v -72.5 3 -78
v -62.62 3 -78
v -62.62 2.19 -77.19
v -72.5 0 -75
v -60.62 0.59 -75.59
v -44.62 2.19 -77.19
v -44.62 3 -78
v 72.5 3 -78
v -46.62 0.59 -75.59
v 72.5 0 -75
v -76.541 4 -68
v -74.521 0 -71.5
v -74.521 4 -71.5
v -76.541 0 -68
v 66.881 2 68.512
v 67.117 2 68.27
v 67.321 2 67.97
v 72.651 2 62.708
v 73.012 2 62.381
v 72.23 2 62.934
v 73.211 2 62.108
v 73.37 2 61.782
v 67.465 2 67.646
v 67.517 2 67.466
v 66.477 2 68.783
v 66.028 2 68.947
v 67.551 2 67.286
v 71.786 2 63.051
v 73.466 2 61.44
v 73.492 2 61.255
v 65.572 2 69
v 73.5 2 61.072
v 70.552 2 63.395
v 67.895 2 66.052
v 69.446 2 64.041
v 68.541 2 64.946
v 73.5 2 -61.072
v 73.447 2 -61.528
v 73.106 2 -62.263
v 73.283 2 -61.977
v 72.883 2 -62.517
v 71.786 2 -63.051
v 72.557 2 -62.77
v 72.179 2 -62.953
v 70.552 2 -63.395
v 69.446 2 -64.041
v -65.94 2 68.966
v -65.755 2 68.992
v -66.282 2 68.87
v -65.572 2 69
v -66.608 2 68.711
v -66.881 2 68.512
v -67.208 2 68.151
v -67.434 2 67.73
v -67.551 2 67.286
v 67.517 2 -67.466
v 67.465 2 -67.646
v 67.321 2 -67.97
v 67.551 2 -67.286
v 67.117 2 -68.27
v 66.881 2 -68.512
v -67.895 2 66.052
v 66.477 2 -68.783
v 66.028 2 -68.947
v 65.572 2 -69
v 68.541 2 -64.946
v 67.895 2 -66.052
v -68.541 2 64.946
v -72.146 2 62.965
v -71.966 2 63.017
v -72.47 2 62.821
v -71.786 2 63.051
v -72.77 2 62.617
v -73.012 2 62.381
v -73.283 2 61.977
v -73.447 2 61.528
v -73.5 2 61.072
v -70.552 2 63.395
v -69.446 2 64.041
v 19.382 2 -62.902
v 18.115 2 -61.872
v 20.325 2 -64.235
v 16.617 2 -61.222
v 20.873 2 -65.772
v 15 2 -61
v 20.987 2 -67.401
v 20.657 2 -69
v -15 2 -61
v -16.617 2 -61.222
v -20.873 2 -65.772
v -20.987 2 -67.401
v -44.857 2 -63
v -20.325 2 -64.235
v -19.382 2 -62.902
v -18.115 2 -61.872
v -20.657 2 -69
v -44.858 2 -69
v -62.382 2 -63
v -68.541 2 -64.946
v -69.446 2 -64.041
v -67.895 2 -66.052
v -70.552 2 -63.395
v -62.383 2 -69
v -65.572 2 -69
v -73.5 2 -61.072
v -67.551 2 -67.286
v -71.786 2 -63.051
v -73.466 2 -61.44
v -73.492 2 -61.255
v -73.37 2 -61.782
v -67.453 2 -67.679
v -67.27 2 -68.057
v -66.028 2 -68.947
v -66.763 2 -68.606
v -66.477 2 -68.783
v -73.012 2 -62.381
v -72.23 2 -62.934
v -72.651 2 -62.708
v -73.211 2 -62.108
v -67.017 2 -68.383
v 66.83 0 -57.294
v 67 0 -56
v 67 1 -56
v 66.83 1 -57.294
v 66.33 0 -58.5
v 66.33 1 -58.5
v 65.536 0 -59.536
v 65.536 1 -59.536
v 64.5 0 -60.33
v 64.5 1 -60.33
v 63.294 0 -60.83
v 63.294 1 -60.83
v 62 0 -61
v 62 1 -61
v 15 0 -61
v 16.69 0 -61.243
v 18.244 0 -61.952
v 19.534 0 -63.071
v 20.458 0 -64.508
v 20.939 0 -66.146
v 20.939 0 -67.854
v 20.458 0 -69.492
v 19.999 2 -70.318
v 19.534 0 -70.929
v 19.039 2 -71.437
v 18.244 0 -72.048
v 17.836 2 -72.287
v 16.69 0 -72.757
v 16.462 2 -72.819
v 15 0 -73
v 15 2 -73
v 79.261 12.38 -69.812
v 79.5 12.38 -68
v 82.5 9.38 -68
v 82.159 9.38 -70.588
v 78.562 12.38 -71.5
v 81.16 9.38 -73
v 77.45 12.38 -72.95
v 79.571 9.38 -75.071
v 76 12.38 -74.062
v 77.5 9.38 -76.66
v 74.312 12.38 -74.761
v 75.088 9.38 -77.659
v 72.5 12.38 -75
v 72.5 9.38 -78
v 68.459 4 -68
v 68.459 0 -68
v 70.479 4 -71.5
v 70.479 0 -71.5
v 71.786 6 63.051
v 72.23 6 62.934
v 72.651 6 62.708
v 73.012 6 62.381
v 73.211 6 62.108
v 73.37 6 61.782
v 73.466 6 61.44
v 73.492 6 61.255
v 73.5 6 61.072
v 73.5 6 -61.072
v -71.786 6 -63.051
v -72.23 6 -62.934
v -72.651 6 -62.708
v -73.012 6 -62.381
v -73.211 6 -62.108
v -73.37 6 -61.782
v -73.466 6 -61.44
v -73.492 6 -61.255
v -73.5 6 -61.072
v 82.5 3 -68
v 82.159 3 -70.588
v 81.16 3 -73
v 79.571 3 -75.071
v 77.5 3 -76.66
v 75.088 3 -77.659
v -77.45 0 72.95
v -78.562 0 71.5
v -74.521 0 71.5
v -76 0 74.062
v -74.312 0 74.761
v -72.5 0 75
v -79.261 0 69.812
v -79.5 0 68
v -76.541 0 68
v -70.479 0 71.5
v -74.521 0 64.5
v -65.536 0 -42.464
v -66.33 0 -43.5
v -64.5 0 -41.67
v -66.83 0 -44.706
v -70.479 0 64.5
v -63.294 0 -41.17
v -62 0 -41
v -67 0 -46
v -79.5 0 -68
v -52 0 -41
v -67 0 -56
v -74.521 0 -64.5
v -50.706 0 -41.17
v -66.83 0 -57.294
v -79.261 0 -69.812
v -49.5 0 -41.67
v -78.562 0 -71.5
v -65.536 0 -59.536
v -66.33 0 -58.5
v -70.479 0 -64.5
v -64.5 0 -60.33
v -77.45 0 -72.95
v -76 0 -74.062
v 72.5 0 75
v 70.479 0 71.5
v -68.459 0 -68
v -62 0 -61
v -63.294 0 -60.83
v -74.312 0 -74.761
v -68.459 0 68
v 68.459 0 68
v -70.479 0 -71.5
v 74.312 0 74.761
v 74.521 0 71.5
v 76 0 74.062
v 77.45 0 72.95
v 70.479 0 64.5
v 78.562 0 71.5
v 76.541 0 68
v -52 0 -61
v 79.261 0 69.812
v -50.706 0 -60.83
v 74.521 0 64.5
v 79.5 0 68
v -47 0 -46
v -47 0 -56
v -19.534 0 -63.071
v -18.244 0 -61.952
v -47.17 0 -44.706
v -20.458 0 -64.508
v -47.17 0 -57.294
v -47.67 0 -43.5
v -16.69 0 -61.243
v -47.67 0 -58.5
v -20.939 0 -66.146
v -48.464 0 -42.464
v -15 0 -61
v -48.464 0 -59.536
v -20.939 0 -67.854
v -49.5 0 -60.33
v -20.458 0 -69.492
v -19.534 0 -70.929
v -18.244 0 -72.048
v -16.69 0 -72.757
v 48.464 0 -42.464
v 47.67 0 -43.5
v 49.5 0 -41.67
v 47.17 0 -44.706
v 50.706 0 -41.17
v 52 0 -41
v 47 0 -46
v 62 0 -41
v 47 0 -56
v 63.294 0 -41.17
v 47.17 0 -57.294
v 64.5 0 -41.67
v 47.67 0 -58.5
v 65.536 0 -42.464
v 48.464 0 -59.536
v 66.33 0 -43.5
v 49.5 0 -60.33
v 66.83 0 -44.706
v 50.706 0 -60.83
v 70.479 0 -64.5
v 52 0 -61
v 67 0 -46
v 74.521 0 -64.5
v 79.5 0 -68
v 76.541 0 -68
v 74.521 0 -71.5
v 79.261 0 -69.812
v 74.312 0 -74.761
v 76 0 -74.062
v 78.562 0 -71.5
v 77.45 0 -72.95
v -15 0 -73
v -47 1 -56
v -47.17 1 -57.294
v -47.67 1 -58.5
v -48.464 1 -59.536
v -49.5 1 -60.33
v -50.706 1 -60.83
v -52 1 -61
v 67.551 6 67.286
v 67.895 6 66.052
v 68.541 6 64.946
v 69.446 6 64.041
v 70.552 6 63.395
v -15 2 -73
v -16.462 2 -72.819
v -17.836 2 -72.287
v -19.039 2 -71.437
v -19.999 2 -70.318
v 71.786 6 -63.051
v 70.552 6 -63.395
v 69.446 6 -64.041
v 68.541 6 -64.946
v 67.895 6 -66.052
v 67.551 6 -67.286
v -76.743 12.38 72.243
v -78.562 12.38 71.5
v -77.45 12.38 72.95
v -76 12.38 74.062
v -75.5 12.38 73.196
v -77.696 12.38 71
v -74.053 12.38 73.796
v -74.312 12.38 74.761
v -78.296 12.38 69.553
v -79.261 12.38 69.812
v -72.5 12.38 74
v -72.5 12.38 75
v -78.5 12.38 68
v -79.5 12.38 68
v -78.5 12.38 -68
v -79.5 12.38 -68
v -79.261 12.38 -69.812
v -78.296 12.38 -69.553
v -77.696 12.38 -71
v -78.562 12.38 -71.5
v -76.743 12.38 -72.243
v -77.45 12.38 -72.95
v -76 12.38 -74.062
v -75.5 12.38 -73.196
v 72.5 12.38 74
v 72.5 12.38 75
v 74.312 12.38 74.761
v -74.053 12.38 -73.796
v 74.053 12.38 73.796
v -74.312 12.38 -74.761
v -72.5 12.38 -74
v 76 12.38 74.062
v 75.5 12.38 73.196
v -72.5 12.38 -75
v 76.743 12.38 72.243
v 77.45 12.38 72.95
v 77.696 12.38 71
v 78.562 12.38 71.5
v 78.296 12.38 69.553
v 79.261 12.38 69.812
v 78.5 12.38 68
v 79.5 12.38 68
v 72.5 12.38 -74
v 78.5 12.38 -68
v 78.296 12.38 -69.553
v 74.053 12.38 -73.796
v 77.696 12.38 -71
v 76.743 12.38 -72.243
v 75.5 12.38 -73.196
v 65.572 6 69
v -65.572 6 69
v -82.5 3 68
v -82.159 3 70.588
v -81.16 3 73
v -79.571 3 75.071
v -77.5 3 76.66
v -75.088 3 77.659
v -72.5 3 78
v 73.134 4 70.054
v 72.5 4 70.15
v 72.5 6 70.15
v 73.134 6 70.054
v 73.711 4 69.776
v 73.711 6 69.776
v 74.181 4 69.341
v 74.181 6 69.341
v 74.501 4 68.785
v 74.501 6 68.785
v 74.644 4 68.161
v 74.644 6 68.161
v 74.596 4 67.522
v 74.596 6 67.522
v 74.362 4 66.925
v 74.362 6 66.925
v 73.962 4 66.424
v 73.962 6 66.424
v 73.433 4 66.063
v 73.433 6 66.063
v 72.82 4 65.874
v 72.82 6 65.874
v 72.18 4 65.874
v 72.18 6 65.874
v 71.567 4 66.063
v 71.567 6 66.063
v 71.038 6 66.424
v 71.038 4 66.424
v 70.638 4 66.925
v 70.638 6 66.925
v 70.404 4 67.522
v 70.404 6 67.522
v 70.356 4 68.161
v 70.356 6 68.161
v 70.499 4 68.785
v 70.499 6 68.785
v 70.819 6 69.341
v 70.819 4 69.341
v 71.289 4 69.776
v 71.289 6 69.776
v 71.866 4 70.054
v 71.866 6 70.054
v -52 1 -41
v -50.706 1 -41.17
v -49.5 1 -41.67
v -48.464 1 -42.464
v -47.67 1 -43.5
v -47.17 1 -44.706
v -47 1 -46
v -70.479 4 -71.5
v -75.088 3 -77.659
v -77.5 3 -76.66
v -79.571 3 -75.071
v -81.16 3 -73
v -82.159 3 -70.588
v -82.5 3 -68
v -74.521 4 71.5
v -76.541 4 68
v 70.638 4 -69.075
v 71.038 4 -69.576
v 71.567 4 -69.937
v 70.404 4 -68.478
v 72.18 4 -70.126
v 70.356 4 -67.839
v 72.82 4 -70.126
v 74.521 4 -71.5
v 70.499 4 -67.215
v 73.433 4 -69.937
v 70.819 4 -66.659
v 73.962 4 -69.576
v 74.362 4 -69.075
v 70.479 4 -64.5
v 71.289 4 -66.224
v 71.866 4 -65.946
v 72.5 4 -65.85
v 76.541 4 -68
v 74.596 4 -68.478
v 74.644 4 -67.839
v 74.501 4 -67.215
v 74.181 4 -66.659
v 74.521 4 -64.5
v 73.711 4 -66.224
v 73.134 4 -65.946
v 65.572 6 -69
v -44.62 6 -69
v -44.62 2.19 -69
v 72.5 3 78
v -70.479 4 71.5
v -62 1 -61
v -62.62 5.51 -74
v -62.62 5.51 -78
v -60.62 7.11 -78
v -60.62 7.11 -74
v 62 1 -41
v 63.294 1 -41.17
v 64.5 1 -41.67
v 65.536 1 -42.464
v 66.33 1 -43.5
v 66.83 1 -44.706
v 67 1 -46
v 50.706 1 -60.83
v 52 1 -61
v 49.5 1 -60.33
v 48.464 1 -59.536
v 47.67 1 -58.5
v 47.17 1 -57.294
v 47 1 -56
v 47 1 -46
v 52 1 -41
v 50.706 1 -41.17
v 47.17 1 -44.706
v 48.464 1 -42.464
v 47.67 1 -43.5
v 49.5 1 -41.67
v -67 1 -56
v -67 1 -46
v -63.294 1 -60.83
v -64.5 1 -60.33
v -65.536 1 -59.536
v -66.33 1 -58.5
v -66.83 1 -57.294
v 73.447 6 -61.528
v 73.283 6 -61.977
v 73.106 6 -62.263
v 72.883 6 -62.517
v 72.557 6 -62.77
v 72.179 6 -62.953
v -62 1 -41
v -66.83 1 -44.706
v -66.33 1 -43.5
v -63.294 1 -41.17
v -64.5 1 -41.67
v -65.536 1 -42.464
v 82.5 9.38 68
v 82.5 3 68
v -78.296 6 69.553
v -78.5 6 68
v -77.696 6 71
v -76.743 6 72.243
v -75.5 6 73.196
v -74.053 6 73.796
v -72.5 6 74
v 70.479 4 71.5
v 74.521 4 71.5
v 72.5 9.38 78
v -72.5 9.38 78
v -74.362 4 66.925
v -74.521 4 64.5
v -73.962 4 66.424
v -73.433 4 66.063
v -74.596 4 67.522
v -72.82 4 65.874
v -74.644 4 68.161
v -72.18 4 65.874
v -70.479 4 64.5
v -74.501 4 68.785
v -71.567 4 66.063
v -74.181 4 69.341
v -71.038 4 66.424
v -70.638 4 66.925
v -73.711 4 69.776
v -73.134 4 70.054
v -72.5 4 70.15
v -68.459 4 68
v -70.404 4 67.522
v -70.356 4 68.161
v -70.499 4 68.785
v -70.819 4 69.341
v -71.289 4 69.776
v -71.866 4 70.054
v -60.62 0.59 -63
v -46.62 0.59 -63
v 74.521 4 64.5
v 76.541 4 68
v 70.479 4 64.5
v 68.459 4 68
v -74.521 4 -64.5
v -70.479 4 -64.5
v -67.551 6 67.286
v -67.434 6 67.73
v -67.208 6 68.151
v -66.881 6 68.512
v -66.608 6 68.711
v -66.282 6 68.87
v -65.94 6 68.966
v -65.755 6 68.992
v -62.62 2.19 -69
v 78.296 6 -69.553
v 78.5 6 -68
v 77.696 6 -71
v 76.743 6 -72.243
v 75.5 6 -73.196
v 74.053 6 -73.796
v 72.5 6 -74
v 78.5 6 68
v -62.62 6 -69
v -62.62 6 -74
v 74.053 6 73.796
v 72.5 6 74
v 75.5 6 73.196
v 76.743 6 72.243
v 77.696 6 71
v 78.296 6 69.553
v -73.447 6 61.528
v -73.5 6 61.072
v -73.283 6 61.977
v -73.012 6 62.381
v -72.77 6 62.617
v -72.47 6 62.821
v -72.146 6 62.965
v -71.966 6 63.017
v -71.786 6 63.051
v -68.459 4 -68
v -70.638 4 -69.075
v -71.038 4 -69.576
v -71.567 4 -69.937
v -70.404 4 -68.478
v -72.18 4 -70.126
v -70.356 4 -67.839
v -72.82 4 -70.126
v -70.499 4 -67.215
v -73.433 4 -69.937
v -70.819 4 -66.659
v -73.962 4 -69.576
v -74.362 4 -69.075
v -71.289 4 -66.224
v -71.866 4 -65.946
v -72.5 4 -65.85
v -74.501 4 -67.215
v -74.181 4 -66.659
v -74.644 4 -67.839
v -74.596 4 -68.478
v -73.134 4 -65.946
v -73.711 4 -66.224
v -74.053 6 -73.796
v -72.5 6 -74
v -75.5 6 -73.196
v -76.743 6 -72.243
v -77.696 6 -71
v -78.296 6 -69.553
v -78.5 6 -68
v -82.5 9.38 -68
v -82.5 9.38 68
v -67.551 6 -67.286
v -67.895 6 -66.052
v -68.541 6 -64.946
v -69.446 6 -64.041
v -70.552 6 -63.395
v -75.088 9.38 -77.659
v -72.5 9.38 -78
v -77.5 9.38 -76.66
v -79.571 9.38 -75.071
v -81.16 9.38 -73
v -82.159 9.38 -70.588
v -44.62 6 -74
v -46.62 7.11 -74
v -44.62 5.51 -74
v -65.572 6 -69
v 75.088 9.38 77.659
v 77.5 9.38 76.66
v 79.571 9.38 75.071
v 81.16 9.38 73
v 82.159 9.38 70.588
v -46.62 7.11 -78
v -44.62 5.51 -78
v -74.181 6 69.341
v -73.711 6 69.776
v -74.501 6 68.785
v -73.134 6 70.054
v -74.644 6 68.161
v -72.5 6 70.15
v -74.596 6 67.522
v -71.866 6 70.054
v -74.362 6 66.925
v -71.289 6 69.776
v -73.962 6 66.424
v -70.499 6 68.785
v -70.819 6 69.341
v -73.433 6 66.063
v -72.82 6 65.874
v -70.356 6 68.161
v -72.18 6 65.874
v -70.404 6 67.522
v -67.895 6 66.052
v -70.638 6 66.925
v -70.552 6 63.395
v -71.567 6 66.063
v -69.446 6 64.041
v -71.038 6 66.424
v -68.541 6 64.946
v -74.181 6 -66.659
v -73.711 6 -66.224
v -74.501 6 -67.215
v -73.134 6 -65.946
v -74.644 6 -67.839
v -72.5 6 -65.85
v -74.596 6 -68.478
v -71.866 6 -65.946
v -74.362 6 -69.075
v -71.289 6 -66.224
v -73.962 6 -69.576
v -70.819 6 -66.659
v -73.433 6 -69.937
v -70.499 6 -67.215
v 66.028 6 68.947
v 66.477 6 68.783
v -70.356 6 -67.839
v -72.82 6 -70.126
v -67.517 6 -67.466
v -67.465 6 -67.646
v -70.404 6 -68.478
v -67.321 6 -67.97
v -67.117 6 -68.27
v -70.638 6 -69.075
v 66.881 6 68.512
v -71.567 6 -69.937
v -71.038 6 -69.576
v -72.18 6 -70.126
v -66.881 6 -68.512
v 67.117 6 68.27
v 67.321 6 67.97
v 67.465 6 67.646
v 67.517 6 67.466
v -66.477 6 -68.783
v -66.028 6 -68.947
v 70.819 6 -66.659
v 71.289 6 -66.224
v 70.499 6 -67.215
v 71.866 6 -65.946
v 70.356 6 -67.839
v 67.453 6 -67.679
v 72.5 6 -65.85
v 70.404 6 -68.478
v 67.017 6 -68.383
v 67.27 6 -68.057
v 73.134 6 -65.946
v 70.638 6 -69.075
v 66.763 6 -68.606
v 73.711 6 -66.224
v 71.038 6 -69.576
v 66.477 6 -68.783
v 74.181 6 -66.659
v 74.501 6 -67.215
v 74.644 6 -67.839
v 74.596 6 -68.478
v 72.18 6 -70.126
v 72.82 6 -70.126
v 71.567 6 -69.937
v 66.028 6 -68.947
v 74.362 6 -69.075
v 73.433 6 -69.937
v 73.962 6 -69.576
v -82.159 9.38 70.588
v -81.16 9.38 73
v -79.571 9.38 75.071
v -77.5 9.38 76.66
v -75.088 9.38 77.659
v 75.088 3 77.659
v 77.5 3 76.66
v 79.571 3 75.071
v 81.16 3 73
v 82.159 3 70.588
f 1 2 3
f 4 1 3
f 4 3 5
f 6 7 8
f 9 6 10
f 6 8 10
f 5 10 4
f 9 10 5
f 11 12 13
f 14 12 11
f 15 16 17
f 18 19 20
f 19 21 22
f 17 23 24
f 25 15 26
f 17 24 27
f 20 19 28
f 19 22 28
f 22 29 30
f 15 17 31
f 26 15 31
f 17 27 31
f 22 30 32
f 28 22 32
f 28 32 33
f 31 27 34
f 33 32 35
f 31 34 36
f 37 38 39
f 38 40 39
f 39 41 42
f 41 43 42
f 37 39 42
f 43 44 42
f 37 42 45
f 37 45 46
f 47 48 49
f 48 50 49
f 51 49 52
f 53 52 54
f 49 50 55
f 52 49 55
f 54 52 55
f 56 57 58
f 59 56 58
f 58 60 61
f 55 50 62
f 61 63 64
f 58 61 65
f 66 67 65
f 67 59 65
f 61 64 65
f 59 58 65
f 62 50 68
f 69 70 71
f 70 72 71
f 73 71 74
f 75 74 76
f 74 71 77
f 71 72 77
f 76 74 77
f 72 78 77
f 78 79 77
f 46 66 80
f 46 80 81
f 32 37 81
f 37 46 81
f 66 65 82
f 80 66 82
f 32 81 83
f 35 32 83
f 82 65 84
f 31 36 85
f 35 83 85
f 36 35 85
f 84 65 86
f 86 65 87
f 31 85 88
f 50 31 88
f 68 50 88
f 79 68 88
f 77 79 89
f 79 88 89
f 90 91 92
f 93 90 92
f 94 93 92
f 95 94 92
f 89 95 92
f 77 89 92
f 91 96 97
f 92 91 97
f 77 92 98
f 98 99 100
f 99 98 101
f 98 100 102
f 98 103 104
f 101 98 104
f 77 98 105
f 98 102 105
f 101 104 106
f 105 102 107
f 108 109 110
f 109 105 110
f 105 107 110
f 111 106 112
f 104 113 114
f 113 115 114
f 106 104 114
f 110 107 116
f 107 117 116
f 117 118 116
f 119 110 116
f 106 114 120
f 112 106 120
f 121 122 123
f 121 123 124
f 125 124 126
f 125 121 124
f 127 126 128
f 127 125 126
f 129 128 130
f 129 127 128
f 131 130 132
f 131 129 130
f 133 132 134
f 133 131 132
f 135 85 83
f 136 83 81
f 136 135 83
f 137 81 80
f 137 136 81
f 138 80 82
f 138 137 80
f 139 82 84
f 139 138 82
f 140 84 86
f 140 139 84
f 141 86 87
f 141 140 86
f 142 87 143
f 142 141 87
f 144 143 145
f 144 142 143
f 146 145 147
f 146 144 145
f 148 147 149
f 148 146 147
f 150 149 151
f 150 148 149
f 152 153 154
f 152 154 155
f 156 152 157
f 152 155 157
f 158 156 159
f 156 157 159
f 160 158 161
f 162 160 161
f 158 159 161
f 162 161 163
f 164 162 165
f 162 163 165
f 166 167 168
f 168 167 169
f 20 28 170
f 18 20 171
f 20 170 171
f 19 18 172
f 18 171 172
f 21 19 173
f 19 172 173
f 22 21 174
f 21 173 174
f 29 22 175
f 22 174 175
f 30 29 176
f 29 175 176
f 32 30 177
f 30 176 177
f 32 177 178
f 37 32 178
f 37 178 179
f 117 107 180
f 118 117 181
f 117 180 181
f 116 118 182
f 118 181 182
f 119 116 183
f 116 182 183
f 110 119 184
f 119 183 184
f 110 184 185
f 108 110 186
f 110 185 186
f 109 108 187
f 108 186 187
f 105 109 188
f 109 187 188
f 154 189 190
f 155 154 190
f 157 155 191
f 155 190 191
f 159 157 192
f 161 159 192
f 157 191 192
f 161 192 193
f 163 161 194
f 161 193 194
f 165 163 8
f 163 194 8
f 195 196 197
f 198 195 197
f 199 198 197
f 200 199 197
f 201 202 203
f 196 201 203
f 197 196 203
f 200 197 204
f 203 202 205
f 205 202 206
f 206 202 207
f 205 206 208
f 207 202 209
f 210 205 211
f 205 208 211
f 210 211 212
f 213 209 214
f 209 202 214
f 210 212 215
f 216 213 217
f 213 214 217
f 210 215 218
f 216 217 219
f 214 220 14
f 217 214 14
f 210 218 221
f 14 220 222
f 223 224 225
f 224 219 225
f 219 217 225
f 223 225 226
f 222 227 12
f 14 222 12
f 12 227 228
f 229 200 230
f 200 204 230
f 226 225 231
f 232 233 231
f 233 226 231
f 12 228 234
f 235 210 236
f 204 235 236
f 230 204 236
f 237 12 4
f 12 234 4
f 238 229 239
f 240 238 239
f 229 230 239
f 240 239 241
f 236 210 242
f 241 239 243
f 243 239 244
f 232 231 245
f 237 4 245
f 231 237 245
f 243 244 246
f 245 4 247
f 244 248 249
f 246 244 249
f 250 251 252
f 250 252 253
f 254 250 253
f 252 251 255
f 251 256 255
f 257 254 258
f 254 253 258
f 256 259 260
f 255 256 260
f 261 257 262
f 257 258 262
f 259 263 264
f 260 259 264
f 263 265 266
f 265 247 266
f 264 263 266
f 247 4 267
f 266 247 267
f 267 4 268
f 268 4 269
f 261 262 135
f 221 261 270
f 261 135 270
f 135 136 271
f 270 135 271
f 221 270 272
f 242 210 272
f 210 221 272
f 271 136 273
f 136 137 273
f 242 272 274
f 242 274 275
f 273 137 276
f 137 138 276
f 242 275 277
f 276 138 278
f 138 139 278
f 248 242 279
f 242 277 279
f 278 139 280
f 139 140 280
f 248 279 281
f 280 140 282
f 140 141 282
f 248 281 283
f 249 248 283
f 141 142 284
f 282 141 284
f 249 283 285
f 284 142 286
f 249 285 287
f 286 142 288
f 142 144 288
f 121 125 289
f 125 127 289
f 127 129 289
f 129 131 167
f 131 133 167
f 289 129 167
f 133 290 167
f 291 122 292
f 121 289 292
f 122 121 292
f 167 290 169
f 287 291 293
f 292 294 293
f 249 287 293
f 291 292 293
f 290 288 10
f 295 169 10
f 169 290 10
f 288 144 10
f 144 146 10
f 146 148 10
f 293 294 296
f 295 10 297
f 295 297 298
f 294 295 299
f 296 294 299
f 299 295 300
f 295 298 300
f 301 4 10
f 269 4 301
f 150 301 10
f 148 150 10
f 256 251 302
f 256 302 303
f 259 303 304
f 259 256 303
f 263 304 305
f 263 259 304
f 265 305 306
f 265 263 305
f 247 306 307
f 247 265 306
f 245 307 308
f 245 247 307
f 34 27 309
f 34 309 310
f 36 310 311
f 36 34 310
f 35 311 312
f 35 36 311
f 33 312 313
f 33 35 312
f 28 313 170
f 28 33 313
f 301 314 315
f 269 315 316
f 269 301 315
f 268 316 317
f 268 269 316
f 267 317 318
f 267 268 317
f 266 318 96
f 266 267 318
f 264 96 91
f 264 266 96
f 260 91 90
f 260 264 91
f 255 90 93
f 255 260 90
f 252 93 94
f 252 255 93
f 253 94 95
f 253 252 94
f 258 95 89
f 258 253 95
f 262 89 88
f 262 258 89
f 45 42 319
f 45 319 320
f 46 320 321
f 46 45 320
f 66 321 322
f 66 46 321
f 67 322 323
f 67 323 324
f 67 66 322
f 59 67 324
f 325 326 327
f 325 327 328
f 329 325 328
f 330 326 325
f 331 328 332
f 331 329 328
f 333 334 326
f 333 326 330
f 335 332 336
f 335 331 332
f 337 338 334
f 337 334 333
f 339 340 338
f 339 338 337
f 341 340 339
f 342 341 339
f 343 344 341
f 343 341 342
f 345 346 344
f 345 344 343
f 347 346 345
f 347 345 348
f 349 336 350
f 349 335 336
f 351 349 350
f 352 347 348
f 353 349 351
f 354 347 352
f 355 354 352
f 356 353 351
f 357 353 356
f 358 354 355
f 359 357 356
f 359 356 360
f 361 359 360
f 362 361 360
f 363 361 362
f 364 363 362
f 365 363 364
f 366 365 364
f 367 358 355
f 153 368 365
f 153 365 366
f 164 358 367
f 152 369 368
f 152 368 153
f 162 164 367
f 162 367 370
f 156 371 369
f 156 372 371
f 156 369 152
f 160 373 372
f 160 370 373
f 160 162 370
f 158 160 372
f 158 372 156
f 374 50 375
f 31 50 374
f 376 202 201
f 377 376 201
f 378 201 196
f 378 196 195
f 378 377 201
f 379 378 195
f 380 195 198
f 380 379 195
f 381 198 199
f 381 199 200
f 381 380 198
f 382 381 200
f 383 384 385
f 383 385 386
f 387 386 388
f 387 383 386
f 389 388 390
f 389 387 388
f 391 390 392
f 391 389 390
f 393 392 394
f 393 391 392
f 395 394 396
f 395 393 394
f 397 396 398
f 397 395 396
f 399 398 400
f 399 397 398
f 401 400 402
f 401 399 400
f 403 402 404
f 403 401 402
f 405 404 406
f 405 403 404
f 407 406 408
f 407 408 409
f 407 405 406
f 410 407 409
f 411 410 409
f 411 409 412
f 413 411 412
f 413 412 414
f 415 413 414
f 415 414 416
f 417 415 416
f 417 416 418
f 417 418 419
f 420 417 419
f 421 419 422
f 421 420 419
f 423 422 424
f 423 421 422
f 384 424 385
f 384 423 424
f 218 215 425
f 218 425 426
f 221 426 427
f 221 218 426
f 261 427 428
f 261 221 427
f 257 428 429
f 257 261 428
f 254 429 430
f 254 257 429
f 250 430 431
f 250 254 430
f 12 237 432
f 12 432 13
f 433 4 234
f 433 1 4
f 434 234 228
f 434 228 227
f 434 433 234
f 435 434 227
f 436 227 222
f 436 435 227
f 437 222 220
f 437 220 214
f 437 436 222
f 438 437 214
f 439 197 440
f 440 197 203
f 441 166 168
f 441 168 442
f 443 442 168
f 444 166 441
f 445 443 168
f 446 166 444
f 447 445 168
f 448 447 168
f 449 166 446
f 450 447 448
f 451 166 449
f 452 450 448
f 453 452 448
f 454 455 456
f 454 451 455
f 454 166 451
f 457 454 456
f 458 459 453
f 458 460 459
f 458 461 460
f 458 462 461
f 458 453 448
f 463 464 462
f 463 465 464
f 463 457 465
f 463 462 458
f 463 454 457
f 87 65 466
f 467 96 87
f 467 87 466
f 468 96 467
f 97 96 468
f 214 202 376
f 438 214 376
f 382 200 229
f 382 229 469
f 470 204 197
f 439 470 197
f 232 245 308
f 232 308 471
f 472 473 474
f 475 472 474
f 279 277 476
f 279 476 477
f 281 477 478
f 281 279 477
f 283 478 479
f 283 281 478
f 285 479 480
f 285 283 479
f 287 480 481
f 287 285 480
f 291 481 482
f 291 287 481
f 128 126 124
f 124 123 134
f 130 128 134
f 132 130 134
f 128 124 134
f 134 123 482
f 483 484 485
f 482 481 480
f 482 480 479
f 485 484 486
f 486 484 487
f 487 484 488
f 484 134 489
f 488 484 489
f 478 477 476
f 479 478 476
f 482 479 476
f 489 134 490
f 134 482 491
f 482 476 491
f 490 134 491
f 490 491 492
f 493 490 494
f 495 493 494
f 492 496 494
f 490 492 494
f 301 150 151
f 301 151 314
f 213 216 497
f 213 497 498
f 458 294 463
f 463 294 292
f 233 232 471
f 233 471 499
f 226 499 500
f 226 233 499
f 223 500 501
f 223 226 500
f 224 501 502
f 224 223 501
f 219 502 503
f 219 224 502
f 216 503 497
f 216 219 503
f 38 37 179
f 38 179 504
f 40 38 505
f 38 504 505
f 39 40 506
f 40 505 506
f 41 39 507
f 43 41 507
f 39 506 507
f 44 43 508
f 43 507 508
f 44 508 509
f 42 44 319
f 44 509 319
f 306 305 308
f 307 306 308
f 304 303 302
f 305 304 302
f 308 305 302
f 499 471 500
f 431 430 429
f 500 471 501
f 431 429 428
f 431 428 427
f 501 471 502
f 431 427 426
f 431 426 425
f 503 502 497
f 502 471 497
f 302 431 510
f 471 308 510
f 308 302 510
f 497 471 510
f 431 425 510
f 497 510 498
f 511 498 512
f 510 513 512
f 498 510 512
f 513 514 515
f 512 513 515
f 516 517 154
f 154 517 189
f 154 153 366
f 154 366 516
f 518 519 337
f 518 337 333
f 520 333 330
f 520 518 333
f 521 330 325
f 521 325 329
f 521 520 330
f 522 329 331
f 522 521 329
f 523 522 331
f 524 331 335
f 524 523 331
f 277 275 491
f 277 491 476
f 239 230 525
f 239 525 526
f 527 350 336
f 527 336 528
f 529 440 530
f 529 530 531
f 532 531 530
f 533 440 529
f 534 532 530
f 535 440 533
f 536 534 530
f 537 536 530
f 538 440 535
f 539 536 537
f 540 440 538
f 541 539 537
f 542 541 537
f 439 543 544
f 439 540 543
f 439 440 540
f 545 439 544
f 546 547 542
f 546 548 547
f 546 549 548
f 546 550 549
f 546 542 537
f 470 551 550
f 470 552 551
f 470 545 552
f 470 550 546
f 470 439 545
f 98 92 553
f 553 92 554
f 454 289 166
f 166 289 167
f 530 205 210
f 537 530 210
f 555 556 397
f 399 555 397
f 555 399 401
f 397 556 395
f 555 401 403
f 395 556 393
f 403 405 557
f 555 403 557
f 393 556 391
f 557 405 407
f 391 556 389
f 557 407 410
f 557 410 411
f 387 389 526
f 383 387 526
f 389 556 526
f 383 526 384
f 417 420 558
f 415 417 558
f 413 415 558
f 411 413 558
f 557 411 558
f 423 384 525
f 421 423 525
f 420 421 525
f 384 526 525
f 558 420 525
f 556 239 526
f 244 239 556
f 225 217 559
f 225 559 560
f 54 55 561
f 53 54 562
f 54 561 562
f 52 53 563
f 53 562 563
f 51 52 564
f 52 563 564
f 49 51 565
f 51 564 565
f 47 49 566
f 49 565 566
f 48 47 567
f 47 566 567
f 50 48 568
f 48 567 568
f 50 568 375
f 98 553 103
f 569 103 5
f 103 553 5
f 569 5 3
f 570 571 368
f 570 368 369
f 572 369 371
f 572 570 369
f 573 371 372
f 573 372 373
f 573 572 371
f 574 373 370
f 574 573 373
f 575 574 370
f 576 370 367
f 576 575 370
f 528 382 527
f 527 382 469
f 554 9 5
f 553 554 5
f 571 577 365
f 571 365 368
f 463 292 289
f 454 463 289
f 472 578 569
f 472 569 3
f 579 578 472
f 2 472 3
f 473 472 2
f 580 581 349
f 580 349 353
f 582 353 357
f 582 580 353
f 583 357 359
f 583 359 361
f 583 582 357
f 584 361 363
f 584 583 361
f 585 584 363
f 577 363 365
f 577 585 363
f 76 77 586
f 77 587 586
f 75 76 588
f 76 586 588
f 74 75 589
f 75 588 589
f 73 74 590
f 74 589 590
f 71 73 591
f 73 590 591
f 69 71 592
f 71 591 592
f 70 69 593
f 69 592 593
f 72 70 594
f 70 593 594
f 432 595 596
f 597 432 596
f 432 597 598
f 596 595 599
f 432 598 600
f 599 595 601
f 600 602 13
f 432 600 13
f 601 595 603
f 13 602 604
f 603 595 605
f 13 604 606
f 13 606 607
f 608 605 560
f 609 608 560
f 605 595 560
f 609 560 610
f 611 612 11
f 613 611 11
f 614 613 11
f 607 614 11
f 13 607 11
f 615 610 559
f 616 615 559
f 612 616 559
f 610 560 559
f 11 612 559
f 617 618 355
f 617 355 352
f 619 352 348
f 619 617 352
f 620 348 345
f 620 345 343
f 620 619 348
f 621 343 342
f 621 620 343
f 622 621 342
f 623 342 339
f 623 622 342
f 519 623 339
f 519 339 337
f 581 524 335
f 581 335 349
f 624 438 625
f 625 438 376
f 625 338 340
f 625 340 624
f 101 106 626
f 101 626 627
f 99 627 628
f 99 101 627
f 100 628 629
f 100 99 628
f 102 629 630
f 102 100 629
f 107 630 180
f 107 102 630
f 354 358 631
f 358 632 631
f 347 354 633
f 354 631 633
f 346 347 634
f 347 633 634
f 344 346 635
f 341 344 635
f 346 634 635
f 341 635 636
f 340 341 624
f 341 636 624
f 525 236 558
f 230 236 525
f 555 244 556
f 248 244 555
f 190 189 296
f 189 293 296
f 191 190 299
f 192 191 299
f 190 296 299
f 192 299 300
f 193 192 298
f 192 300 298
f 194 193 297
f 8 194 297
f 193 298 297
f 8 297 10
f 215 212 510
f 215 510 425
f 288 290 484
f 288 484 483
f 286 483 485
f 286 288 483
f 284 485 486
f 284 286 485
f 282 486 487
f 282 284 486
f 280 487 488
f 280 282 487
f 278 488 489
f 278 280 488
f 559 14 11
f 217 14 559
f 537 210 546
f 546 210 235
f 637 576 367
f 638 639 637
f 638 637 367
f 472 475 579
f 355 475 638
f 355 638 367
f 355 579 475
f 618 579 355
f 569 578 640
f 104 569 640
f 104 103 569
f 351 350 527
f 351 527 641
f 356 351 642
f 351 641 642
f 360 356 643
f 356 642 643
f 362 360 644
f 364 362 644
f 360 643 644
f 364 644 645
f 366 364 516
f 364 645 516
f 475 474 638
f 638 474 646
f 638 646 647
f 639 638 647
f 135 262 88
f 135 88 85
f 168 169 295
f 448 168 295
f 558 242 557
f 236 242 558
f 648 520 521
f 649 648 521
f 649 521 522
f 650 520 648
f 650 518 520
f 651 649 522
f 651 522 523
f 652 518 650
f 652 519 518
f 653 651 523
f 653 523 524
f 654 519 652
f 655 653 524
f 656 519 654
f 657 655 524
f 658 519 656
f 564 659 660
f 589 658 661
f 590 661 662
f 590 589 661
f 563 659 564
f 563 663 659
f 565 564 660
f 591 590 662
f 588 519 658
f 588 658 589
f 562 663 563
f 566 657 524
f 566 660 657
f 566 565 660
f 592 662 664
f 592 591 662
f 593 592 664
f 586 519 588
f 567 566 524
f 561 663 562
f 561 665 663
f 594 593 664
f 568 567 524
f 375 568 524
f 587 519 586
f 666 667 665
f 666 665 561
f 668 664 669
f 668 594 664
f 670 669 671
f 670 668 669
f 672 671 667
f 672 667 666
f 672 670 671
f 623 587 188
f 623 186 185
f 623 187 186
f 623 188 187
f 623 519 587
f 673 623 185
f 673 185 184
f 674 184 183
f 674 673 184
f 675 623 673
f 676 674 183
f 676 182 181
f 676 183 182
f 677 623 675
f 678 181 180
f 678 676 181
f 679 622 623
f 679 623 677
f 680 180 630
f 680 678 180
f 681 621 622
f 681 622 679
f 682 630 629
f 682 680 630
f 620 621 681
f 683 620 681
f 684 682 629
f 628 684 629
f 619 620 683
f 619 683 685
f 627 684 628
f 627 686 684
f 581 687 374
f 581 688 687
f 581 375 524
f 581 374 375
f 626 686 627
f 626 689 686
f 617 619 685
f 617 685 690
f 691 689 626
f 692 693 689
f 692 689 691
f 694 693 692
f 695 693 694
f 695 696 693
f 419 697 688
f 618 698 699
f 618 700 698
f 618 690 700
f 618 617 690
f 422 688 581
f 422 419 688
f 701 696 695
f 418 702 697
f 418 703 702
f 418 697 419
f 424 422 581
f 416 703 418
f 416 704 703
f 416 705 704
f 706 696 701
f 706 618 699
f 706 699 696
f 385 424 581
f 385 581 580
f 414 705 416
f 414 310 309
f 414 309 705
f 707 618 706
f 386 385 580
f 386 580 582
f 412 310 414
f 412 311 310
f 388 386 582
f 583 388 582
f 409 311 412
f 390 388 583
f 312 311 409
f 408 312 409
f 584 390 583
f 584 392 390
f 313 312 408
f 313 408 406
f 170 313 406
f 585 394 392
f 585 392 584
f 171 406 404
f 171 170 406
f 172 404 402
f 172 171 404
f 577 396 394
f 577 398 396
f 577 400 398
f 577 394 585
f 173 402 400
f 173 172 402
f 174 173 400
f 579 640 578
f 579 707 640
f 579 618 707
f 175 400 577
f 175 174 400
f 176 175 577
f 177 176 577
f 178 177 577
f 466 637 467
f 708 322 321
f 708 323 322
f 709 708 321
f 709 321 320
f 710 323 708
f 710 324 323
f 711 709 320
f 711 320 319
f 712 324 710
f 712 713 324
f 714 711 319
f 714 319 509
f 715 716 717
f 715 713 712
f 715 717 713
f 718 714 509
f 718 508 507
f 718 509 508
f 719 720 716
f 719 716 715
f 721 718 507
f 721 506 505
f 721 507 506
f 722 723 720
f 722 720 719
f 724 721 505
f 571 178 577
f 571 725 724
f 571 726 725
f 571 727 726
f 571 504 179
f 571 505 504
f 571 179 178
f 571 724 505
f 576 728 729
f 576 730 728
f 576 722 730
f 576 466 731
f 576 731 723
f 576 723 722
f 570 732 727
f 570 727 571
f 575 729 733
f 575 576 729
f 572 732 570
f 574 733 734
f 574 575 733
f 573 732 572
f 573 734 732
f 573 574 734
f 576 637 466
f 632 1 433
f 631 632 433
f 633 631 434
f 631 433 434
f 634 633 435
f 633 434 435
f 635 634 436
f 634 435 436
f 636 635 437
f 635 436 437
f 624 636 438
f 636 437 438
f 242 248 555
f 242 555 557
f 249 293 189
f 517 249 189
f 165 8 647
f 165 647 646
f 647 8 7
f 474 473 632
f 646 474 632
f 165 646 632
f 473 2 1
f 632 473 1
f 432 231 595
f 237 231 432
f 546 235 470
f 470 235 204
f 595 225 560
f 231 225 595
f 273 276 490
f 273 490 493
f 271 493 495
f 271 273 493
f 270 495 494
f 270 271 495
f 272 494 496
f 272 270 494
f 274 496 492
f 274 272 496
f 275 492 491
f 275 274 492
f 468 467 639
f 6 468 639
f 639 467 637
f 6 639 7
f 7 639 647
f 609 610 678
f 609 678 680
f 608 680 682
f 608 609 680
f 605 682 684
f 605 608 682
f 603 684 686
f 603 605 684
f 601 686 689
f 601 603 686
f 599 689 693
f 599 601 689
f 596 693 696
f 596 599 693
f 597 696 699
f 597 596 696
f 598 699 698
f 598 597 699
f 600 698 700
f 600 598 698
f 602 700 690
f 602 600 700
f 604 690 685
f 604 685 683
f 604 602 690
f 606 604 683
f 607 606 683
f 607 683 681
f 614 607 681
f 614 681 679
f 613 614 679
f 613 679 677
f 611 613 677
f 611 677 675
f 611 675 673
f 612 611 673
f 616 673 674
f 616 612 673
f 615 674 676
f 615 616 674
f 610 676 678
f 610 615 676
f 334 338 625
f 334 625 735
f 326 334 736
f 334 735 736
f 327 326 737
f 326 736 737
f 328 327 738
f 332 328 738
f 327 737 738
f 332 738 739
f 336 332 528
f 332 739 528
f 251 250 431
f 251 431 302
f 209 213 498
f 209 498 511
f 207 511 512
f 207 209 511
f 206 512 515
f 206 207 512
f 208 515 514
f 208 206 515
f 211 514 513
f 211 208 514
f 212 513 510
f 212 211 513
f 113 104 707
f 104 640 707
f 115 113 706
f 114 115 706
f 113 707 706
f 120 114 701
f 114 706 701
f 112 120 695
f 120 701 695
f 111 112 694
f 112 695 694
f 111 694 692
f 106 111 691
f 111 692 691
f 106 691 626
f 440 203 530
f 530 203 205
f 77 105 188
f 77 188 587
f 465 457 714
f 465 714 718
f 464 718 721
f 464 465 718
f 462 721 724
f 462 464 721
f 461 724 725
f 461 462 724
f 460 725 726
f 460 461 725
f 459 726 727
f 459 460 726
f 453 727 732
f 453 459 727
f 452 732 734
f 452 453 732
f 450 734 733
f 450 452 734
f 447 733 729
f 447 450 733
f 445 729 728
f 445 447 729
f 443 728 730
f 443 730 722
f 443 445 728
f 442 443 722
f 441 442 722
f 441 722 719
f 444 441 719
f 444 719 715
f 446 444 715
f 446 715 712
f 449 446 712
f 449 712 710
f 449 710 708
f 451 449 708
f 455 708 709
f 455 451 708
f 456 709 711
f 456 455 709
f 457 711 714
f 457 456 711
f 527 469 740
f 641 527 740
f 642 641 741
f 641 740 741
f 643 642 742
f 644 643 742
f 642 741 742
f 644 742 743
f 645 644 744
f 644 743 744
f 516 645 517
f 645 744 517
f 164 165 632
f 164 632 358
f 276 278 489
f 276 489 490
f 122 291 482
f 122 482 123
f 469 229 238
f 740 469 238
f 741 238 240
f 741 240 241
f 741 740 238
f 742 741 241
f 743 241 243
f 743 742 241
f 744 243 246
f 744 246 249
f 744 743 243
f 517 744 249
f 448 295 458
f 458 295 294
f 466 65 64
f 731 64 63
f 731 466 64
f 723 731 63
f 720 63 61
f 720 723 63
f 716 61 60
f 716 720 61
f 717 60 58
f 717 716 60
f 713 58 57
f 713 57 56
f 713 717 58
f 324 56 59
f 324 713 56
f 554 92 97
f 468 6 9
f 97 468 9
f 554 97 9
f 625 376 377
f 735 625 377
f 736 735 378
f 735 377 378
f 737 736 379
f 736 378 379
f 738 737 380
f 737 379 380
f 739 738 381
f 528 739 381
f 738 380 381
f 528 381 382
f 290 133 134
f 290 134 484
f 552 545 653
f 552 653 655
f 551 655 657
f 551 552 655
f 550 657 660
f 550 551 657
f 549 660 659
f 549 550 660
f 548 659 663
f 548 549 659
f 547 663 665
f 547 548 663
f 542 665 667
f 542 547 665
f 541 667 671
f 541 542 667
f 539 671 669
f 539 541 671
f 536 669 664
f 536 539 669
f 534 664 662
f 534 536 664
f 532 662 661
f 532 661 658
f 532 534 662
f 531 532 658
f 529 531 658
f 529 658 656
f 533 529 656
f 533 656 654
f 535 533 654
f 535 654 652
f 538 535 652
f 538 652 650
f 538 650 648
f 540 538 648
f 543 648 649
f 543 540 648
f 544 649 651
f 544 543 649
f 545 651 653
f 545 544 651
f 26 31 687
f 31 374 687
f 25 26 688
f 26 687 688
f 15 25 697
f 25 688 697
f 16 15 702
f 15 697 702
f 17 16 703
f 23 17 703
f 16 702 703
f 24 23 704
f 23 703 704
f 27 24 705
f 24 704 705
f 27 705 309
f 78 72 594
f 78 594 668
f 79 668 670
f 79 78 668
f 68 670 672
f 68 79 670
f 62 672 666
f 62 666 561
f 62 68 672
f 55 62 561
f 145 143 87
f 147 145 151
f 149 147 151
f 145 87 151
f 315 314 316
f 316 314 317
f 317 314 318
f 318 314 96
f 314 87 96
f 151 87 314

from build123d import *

# Parameters (mm, degrees)
BOSS_EXTRUDE2_DEPTH      = 2
BOSS_EXTRUDE3_DEPTH      = 4
BOSS_EXTRUDE3_DEPTH_BACK = 2
SKETCH3_R                = 2.15
BOSS_EXTRUDE4_DEPTH      = 6.38
CUT_EXTRUDE1_DEPTH       = 15
FILLET1_R                = 2
CUT_EXTRUDE3_DEPTH       = 115.008747033
CUT_EXTRUDE3_DEPTH_BACK  = 115.008747033
SKETCH11_R               = 2.15
CUT_EXTRUDE2_DEPTH       = 4
CHAMFER1_SIZE            = 3
SKETCH13_W               = 18
SKETCH13_H               = 5
CUT_EXTRUDE5_DEPTH       = 1
CUT_EXTRUDE6_DEPTH       = 1
CUT_EXTRUDE7_DEPTH       = 2


with BuildPart() as part:
    # Sketch2 → Boss-Extrude2 (new body)
    with BuildSketch(Plane(origin=(0, 0, 0), x_dir=(1, 0, 0), z_dir=(0, 1, 0))):
        with BuildLine():
            Line((-72.5, 74), (72.5, 74))
            ThreePointArc((72.5, 74), (76.742640687, 72.242640687), (78.5, 68))
            Line((78.5, 68), (78.5, -68))
            ThreePointArc((78.5, -68), (76.742640687, -72.242640687), (72.5, -74))
            Line((72.5, -74), (-72.5, -74))
            ThreePointArc((-72.5, -74), (-76.742640687, -72.242640687), (-78.5, -68))
            Line((-78.5, -68), (-78.5, 68))
            ThreePointArc((-78.5, 68), (-76.742640687, 72.242640687), (-72.5, 74))
        make_face()
    extrude(amount=BOSS_EXTRUDE2_DEPTH)

    # Sketch3 → Boss-Extrude3 (add, two sides: drawn at the far end of the back side and taken through both)
    with BuildSketch(Plane(origin=(0, 2, 0), x_dir=(1, 0, 0), z_dir=(0, 1, 0)).offset(-BOSS_EXTRUDE3_DEPTH_BACK)):
        with BuildLine():
            Line((-82.5, 68), (-82.5, -68))
            ThreePointArc((-82.5, -68), (-79.571067812, -75.071067812), (-72.5, -78))
            Line((-72.5, -78), (72.5, -78))
            ThreePointArc((72.5, -78), (79.571067812, -75.071067812), (82.5, -68))
            Line((82.5, -68), (82.5, 68))
            ThreePointArc((82.5, 68), (79.571067812, 75.071067812), (72.5, 78))
            Line((72.5, 78), (-72.5, 78))
            ThreePointArc((-72.5, 78), (-79.571067812, 75.071067812), (-82.5, 68))
        make_face()
        with Locations(Location((-72.5, -68, 0), (0, 0, 270))):
            Circle(SKETCH3_R, mode=Mode.SUBTRACT)
        with Locations(Location((72.5, -68, 0), (0, 0, 270))):
            Circle(SKETCH3_R, mode=Mode.SUBTRACT)
        with Locations(Location((72.5, 68, 0), (0, 0, 270))):
            Circle(SKETCH3_R, mode=Mode.SUBTRACT)
        with Locations(Location((-72.5, 68, 0), (0, 0, 270))):
            Circle(SKETCH3_R, mode=Mode.SUBTRACT)
        with BuildLine():
            Line((-73.5, 63), (-73.5, -63))
            Line((-73.5, -63), (-72.5, -63))
            ThreePointArc((-72.5, -63), (-68.964466094, -64.464466094), (-67.5, -68))
            Line((-67.5, -68), (-67.5, -69))
            Line((-67.5, -69), (67.5, -69))
            Line((67.5, -69), (67.5, -68))
            ThreePointArc((67.5, -68), (68.964466094, -64.464466094), (72.5, -63))
            Line((72.5, -63), (73.5, -63))
            Line((73.5, -63), (73.5, 63))
            Line((73.5, 63), (72.5, 63))
            ThreePointArc((72.5, 63), (68.964466094, 64.464466094), (67.5, 68))
            Line((67.5, 68), (67.5, 69))
            Line((67.5, 69), (-67.5, 69))
            Line((-67.5, 69), (-67.5, 68))
            ThreePointArc((-67.5, 68), (-68.964466094, 64.464466094), (-72.5, 63))
            Line((-72.5, 63), (-73.5, 63))
        make_face(mode=Mode.SUBTRACT)
    extrude(amount=BOSS_EXTRUDE3_DEPTH + BOSS_EXTRUDE3_DEPTH_BACK)

    # Sketch8 → Boss-Extrude4 (add)
    with BuildSketch(Plane(origin=(0, 6, 0), x_dir=(1, 0, 0), z_dir=(0, 1, 0))):
        with BuildLine():
            ThreePointArc((82.5, 68), (79.571067812, 75.071067812), (72.5, 78))
            Line((72.5, 78), (-72.5, 78))
            ThreePointArc((-72.5, 78), (-79.571067812, 75.071067812), (-82.5, 68))
            Line((-82.5, 68), (-82.5, -68))
            ThreePointArc((-82.5, -68), (-79.571067812, -75.071067812), (-72.5, -78))
            Line((-72.5, -78), (72.5, -78))
            ThreePointArc((72.5, -78), (79.571067812, -75.071067812), (82.5, -68))
            Line((82.5, -68), (82.5, 68))
        make_face()
        with BuildLine():
            ThreePointArc((72.5, -74), (76.742640687, -72.242640687), (78.5, -68))
            Line((78.5, -68), (78.5, 68))
            ThreePointArc((78.5, 68), (76.742640687, 72.242640687), (72.5, 74))
            Line((72.5, 74), (-72.5, 74))
            ThreePointArc((-72.5, 74), (-76.742640687, 72.242640687), (-78.5, 68))
            Line((-78.5, 68), (-78.5, -68))
            ThreePointArc((-78.5, -68), (-76.742640687, -72.242640687), (-72.5, -74))
            Line((-72.5, -74), (72.5, -74))
        make_face(mode=Mode.SUBTRACT)
    extrude(amount=BOSS_EXTRUDE4_DEPTH)

    # Sketch9 → Cut-Extrude1 (cut)
    with BuildSketch(Plane(origin=(0, 0, -78), x_dir=(-1, 0, 0), z_dir=(0, 0, -1))):
        Polygon((60.62, 7.11), (46.62, 7.11), (44.62, 5.51), (44.62, 2.19), (46.62, 0.59), (60.62, 0.59), (62.62, 2.19), (62.62, 5.51), align=None)
    extrude(amount=-CUT_EXTRUDE1_DEPTH, mode=Mode.SUBTRACT)

    # Fillet1
    fillet1_edges = [part.edges().sort_by_distance(p)[0] for p in [
        (-67.5, 4, -69),
        (-73.5, 4, -63),
        (-73.5, 4, 63),
        (-67.5, 4, 69),
        (73.5, 4, 63),
        (67.5, 4, 69),
        (67.5, 4, -69),
        (73.5, 4, -63),
    ]]
    fillet(fillet1_edges, radius=FILLET1_R)

    # Sketch11 → Cut-Extrude3 (cut, two sides: drawn at the far end of the back side and taken through both)
    with BuildSketch(Plane(origin=(0, 2, 0), x_dir=(1, 0, 0), z_dir=(0, 1, 0)).offset(-CUT_EXTRUDE3_DEPTH_BACK)):
        with Locations(Location((-72.5, -68, 0), (0, 0, 270))):
            Circle(SKETCH11_R)
        with Locations(Location((72.5, -68, 0), (0, 0, 270))):
            Circle(SKETCH11_R)
        with Locations(Location((72.5, 68, 0), (0, 0, 270))):
            Circle(SKETCH11_R)
        with Locations(Location((-72.5, 68, 0), (0, 0, 270))):
            Circle(SKETCH11_R)
    extrude(amount=CUT_EXTRUDE3_DEPTH + CUT_EXTRUDE3_DEPTH_BACK, mode=Mode.SUBTRACT)

    # Sketch10 → Cut-Extrude2 (cut)
    with BuildSketch(Plane.XZ):
        Polygon((-74.520725942, 64.5), (-70.479274058, 64.5), (-68.458548116, 68), (-70.479274058, 71.5), (-74.520725942, 71.5), (-76.541451884, 68), align=None)
        Polygon((76.541451884, 68), (74.520725942, 64.5), (70.479274058, 64.5), (68.458548116, 68), (70.479274058, 71.5), (74.520725942, 71.5), align=None)
        Polygon((-70.479274058, -64.5), (-68.458548116, -68), (-70.479274058, -71.5), (-74.520725942, -71.5), (-76.541451884, -68), (-74.520725942, -64.5), align=None)
        Polygon((76.541451884, -68), (74.520725942, -64.5), (70.479274058, -64.5), (68.458548116, -68), (70.479274058, -71.5), (74.520725942, -71.5), align=None)
    extrude(amount=-CUT_EXTRUDE2_DEPTH, mode=Mode.SUBTRACT)

    # Chamfer1
    # the kernel refuses this chamfer: 3 mm, written as the material it takes off along each edge
    with BuildSketch(Plane(origin=(-72.5, 12.38, 68), x_dir=(-1, 0, 0), z_dir=(0, 0, -1))) as chamfer1_piece_1:
        Polygon((10 - CHAMFER1_SIZE, 0), (10, -CHAMFER1_SIZE), (10, 0), align=None)
    revolve(axis=Axis((-72.5, 12.38, 68), (0, 1, 0)), revolution_arc=90, mode=Mode.SUBTRACT)
    with BuildSketch(Plane(origin=(-72.5, 12.38, 78), x_dir=(0, 0.02749587661058619, -0.9996219169112968), z_dir=(1, 0, 0)), Plane(origin=(72.5, 0, -78), x_dir=(0, 0.9996219169112968, -0.027495876610586778), z_dir=(-1, 0, 0))) as chamfer1_piece_2:
        Polygon((CHAMFER1_SIZE * 0.999621916911, -CHAMFER1_SIZE * 0.0274958766106), (-CHAMFER1_SIZE * 0.0274958766106, -CHAMFER1_SIZE * 0.999621916911), (0, 0), align=None)
    extrude(amount=145, mode=Mode.SUBTRACT)
    with BuildSketch(Plane(origin=(72.5, 12.38, 68), x_dir=(0, 0, 1), z_dir=(-1, 0, 0))) as chamfer1_piece_3:
        Polygon((10 - CHAMFER1_SIZE, 0), (10, -CHAMFER1_SIZE), (10, 0), align=None)
    revolve(axis=Axis((72.5, 12.38, 68), (0, 1, 0)), revolution_arc=90, mode=Mode.SUBTRACT)
    with BuildSketch(Plane(origin=(82.5, 12.38, 68), x_dir=(-0.9996219169112968, 0.02749587661058619, 0), z_dir=(0, 0, -1)), Plane(origin=(-82.5, 12.38, -68), x_dir=(0.9996219169112968, 0.02749587661058619, 0), z_dir=(0, 0, 1))) as chamfer1_piece_4:
        Polygon((CHAMFER1_SIZE * 0.999621916911, -CHAMFER1_SIZE * 0.0274958766106), (-CHAMFER1_SIZE * 0.0274958766106, -CHAMFER1_SIZE * 0.999621916911), (0, 0), align=None)
    extrude(amount=136, mode=Mode.SUBTRACT)
    with BuildSketch(Plane(origin=(72.5, 12.38, -68), x_dir=(1, 0, 0), z_dir=(0, 0, 1))) as chamfer1_piece_5:
        Polygon((10 - CHAMFER1_SIZE, 0), (10, -CHAMFER1_SIZE), (10, 0), align=None)
    revolve(axis=Axis((72.5, 12.38, -68), (0, 1, 0)), revolution_arc=90, mode=Mode.SUBTRACT)
    with BuildSketch(Plane(origin=(72.5, 12.38, -78), x_dir=(0, -0.9996219169112968, -0.02749587661058678), z_dir=(-1, 0, 0)), Plane(origin=(-72.5, 0, 78), x_dir=(0, -0.02749587661058636, -0.9996219169112968), z_dir=(1, 0, 0))) as chamfer1_piece_6:
        Polygon((CHAMFER1_SIZE * 0.999621916911, CHAMFER1_SIZE * 0.0274958766106), (-CHAMFER1_SIZE * 0.0274958766106, CHAMFER1_SIZE * 0.999621916911), (0, 0), align=None)
    extrude(amount=145, mode=Mode.SUBTRACT)
    with BuildSketch(Plane(origin=(-72.5, 12.38, -68), x_dir=(0, 0, -1), z_dir=(1, 0, 0))) as chamfer1_piece_7:
        Polygon((10 - CHAMFER1_SIZE, 0), (10, -CHAMFER1_SIZE), (10, 0), align=None)
    revolve(axis=Axis((-72.5, 12.38, -68), (0, 1, 0)), revolution_arc=90, mode=Mode.SUBTRACT)
    with BuildSketch(Plane(origin=(-72.5, 0, -68), x_dir=(0, 0, -1), z_dir=(1, 0, 0))) as chamfer1_piece_8:
        Polygon((10 - CHAMFER1_SIZE, 0), (10, CHAMFER1_SIZE), (10, 0), align=None)
    revolve(axis=Axis((-72.5, 0, -68), (0, 1, 0)), revolution_arc=90, mode=Mode.SUBTRACT)
    with BuildSketch(Plane(origin=(-82.5, 0, -68), x_dir=(0.9996219169112968, -0.02749587661058636, 0), z_dir=(0, 0, 1)), Plane(origin=(82.5, 0, 68), x_dir=(-0.9996219169112968, -0.02749587661058636, 0), z_dir=(0, 0, -1))) as chamfer1_piece_9:
        Polygon((CHAMFER1_SIZE * 0.999621916911, CHAMFER1_SIZE * 0.0274958766106), (-CHAMFER1_SIZE * 0.0274958766106, CHAMFER1_SIZE * 0.999621916911), (0, 0), align=None)
    extrude(amount=136, mode=Mode.SUBTRACT)
    with BuildSketch(Plane(origin=(-72.5, 0, 68), x_dir=(-1, 0, 0), z_dir=(0, 0, -1))) as chamfer1_piece_10:
        Polygon((10 - CHAMFER1_SIZE, 0), (10, CHAMFER1_SIZE), (10, 0), align=None)
    revolve(axis=Axis((-72.5, 0, 68), (0, 1, 0)), revolution_arc=90, mode=Mode.SUBTRACT)
    with BuildSketch(Plane(origin=(72.5, 0, 68), x_dir=(0, 0, 1), z_dir=(-1, 0, 0))) as chamfer1_piece_11:
        Polygon((10 - CHAMFER1_SIZE, 0), (10, CHAMFER1_SIZE), (10, 0), align=None)
    revolve(axis=Axis((72.5, 0, 68), (0, 1, 0)), revolution_arc=90, mode=Mode.SUBTRACT)
    with BuildSketch(Plane(origin=(72.5, 0, -68), x_dir=(1, 0, 0), z_dir=(0, 0, 1))) as chamfer1_piece_12:
        Polygon((10, CHAMFER1_SIZE), (10 - CHAMFER1_SIZE, 0), (10, 0), align=None)
    revolve(axis=Axis((72.5, 0, -68), (0, 1, 0)), revolution_arc=90, mode=Mode.SUBTRACT)

    # Sketch13 → Cut-Extrude5 (cut)
    with BuildSketch(Plane(origin=(0, 6, 0), x_dir=(1, 0, 0), z_dir=(0, 1, 0))):
        with Locations((-53.62, 71.5)):
            Rectangle(SKETCH13_W, SKETCH13_H)
    extrude(amount=-CUT_EXTRUDE5_DEPTH, mode=Mode.SUBTRACT)

    # Sketch14 → Cut-Extrude6 (cut)
    with BuildSketch(Plane.XZ):
        with BuildLine():
            Line((-62, -41), (-52, -41))
            ThreePointArc((-52, -41), (-48.464466094, -42.464466094), (-47, -46))
            Line((-47, -46), (-47, -56))
            ThreePointArc((-47, -56), (-48.464466094, -59.535533906), (-52, -61))
            Line((-52, -61), (-62, -61))
            ThreePointArc((-62, -61), (-65.535533906, -59.535533906), (-67, -56))
            Line((-67, -56), (-67, -46))
            ThreePointArc((-67, -46), (-65.535533906, -42.464466094), (-62, -41))
        make_face()
        with BuildLine():
            Line((62, -61), (52, -61))
            ThreePointArc((52, -61), (48.464466094, -59.535533906), (47, -56))
            Line((47, -56), (47, -46))
            ThreePointArc((47, -46), (48.464466094, -42.464466094), (52, -41))
            Line((52, -41), (62, -41))
            ThreePointArc((62, -41), (65.535533906, -42.464466094), (67, -46))
            Line((67, -46), (67, -56))
            ThreePointArc((67, -56), (65.535533906, -59.535533906), (62, -61))
        make_face()
    extrude(amount=-CUT_EXTRUDE6_DEPTH, mode=Mode.SUBTRACT)

    # Sketch15 → Cut-Extrude7 (cut)
    with BuildSketch(Plane.XZ):
        with BuildLine():
            Line((-15, -61), (15, -61))
            ThreePointArc((15, -61), (21, -67), (15, -73))
            Line((15, -73), (-15, -73))
            ThreePointArc((-15, -73), (-21, -67), (-15, -61))
        make_face()
    extrude(amount=-CUT_EXTRUDE7_DEPTH, mode=Mode.SUBTRACT)


solid = part.part
